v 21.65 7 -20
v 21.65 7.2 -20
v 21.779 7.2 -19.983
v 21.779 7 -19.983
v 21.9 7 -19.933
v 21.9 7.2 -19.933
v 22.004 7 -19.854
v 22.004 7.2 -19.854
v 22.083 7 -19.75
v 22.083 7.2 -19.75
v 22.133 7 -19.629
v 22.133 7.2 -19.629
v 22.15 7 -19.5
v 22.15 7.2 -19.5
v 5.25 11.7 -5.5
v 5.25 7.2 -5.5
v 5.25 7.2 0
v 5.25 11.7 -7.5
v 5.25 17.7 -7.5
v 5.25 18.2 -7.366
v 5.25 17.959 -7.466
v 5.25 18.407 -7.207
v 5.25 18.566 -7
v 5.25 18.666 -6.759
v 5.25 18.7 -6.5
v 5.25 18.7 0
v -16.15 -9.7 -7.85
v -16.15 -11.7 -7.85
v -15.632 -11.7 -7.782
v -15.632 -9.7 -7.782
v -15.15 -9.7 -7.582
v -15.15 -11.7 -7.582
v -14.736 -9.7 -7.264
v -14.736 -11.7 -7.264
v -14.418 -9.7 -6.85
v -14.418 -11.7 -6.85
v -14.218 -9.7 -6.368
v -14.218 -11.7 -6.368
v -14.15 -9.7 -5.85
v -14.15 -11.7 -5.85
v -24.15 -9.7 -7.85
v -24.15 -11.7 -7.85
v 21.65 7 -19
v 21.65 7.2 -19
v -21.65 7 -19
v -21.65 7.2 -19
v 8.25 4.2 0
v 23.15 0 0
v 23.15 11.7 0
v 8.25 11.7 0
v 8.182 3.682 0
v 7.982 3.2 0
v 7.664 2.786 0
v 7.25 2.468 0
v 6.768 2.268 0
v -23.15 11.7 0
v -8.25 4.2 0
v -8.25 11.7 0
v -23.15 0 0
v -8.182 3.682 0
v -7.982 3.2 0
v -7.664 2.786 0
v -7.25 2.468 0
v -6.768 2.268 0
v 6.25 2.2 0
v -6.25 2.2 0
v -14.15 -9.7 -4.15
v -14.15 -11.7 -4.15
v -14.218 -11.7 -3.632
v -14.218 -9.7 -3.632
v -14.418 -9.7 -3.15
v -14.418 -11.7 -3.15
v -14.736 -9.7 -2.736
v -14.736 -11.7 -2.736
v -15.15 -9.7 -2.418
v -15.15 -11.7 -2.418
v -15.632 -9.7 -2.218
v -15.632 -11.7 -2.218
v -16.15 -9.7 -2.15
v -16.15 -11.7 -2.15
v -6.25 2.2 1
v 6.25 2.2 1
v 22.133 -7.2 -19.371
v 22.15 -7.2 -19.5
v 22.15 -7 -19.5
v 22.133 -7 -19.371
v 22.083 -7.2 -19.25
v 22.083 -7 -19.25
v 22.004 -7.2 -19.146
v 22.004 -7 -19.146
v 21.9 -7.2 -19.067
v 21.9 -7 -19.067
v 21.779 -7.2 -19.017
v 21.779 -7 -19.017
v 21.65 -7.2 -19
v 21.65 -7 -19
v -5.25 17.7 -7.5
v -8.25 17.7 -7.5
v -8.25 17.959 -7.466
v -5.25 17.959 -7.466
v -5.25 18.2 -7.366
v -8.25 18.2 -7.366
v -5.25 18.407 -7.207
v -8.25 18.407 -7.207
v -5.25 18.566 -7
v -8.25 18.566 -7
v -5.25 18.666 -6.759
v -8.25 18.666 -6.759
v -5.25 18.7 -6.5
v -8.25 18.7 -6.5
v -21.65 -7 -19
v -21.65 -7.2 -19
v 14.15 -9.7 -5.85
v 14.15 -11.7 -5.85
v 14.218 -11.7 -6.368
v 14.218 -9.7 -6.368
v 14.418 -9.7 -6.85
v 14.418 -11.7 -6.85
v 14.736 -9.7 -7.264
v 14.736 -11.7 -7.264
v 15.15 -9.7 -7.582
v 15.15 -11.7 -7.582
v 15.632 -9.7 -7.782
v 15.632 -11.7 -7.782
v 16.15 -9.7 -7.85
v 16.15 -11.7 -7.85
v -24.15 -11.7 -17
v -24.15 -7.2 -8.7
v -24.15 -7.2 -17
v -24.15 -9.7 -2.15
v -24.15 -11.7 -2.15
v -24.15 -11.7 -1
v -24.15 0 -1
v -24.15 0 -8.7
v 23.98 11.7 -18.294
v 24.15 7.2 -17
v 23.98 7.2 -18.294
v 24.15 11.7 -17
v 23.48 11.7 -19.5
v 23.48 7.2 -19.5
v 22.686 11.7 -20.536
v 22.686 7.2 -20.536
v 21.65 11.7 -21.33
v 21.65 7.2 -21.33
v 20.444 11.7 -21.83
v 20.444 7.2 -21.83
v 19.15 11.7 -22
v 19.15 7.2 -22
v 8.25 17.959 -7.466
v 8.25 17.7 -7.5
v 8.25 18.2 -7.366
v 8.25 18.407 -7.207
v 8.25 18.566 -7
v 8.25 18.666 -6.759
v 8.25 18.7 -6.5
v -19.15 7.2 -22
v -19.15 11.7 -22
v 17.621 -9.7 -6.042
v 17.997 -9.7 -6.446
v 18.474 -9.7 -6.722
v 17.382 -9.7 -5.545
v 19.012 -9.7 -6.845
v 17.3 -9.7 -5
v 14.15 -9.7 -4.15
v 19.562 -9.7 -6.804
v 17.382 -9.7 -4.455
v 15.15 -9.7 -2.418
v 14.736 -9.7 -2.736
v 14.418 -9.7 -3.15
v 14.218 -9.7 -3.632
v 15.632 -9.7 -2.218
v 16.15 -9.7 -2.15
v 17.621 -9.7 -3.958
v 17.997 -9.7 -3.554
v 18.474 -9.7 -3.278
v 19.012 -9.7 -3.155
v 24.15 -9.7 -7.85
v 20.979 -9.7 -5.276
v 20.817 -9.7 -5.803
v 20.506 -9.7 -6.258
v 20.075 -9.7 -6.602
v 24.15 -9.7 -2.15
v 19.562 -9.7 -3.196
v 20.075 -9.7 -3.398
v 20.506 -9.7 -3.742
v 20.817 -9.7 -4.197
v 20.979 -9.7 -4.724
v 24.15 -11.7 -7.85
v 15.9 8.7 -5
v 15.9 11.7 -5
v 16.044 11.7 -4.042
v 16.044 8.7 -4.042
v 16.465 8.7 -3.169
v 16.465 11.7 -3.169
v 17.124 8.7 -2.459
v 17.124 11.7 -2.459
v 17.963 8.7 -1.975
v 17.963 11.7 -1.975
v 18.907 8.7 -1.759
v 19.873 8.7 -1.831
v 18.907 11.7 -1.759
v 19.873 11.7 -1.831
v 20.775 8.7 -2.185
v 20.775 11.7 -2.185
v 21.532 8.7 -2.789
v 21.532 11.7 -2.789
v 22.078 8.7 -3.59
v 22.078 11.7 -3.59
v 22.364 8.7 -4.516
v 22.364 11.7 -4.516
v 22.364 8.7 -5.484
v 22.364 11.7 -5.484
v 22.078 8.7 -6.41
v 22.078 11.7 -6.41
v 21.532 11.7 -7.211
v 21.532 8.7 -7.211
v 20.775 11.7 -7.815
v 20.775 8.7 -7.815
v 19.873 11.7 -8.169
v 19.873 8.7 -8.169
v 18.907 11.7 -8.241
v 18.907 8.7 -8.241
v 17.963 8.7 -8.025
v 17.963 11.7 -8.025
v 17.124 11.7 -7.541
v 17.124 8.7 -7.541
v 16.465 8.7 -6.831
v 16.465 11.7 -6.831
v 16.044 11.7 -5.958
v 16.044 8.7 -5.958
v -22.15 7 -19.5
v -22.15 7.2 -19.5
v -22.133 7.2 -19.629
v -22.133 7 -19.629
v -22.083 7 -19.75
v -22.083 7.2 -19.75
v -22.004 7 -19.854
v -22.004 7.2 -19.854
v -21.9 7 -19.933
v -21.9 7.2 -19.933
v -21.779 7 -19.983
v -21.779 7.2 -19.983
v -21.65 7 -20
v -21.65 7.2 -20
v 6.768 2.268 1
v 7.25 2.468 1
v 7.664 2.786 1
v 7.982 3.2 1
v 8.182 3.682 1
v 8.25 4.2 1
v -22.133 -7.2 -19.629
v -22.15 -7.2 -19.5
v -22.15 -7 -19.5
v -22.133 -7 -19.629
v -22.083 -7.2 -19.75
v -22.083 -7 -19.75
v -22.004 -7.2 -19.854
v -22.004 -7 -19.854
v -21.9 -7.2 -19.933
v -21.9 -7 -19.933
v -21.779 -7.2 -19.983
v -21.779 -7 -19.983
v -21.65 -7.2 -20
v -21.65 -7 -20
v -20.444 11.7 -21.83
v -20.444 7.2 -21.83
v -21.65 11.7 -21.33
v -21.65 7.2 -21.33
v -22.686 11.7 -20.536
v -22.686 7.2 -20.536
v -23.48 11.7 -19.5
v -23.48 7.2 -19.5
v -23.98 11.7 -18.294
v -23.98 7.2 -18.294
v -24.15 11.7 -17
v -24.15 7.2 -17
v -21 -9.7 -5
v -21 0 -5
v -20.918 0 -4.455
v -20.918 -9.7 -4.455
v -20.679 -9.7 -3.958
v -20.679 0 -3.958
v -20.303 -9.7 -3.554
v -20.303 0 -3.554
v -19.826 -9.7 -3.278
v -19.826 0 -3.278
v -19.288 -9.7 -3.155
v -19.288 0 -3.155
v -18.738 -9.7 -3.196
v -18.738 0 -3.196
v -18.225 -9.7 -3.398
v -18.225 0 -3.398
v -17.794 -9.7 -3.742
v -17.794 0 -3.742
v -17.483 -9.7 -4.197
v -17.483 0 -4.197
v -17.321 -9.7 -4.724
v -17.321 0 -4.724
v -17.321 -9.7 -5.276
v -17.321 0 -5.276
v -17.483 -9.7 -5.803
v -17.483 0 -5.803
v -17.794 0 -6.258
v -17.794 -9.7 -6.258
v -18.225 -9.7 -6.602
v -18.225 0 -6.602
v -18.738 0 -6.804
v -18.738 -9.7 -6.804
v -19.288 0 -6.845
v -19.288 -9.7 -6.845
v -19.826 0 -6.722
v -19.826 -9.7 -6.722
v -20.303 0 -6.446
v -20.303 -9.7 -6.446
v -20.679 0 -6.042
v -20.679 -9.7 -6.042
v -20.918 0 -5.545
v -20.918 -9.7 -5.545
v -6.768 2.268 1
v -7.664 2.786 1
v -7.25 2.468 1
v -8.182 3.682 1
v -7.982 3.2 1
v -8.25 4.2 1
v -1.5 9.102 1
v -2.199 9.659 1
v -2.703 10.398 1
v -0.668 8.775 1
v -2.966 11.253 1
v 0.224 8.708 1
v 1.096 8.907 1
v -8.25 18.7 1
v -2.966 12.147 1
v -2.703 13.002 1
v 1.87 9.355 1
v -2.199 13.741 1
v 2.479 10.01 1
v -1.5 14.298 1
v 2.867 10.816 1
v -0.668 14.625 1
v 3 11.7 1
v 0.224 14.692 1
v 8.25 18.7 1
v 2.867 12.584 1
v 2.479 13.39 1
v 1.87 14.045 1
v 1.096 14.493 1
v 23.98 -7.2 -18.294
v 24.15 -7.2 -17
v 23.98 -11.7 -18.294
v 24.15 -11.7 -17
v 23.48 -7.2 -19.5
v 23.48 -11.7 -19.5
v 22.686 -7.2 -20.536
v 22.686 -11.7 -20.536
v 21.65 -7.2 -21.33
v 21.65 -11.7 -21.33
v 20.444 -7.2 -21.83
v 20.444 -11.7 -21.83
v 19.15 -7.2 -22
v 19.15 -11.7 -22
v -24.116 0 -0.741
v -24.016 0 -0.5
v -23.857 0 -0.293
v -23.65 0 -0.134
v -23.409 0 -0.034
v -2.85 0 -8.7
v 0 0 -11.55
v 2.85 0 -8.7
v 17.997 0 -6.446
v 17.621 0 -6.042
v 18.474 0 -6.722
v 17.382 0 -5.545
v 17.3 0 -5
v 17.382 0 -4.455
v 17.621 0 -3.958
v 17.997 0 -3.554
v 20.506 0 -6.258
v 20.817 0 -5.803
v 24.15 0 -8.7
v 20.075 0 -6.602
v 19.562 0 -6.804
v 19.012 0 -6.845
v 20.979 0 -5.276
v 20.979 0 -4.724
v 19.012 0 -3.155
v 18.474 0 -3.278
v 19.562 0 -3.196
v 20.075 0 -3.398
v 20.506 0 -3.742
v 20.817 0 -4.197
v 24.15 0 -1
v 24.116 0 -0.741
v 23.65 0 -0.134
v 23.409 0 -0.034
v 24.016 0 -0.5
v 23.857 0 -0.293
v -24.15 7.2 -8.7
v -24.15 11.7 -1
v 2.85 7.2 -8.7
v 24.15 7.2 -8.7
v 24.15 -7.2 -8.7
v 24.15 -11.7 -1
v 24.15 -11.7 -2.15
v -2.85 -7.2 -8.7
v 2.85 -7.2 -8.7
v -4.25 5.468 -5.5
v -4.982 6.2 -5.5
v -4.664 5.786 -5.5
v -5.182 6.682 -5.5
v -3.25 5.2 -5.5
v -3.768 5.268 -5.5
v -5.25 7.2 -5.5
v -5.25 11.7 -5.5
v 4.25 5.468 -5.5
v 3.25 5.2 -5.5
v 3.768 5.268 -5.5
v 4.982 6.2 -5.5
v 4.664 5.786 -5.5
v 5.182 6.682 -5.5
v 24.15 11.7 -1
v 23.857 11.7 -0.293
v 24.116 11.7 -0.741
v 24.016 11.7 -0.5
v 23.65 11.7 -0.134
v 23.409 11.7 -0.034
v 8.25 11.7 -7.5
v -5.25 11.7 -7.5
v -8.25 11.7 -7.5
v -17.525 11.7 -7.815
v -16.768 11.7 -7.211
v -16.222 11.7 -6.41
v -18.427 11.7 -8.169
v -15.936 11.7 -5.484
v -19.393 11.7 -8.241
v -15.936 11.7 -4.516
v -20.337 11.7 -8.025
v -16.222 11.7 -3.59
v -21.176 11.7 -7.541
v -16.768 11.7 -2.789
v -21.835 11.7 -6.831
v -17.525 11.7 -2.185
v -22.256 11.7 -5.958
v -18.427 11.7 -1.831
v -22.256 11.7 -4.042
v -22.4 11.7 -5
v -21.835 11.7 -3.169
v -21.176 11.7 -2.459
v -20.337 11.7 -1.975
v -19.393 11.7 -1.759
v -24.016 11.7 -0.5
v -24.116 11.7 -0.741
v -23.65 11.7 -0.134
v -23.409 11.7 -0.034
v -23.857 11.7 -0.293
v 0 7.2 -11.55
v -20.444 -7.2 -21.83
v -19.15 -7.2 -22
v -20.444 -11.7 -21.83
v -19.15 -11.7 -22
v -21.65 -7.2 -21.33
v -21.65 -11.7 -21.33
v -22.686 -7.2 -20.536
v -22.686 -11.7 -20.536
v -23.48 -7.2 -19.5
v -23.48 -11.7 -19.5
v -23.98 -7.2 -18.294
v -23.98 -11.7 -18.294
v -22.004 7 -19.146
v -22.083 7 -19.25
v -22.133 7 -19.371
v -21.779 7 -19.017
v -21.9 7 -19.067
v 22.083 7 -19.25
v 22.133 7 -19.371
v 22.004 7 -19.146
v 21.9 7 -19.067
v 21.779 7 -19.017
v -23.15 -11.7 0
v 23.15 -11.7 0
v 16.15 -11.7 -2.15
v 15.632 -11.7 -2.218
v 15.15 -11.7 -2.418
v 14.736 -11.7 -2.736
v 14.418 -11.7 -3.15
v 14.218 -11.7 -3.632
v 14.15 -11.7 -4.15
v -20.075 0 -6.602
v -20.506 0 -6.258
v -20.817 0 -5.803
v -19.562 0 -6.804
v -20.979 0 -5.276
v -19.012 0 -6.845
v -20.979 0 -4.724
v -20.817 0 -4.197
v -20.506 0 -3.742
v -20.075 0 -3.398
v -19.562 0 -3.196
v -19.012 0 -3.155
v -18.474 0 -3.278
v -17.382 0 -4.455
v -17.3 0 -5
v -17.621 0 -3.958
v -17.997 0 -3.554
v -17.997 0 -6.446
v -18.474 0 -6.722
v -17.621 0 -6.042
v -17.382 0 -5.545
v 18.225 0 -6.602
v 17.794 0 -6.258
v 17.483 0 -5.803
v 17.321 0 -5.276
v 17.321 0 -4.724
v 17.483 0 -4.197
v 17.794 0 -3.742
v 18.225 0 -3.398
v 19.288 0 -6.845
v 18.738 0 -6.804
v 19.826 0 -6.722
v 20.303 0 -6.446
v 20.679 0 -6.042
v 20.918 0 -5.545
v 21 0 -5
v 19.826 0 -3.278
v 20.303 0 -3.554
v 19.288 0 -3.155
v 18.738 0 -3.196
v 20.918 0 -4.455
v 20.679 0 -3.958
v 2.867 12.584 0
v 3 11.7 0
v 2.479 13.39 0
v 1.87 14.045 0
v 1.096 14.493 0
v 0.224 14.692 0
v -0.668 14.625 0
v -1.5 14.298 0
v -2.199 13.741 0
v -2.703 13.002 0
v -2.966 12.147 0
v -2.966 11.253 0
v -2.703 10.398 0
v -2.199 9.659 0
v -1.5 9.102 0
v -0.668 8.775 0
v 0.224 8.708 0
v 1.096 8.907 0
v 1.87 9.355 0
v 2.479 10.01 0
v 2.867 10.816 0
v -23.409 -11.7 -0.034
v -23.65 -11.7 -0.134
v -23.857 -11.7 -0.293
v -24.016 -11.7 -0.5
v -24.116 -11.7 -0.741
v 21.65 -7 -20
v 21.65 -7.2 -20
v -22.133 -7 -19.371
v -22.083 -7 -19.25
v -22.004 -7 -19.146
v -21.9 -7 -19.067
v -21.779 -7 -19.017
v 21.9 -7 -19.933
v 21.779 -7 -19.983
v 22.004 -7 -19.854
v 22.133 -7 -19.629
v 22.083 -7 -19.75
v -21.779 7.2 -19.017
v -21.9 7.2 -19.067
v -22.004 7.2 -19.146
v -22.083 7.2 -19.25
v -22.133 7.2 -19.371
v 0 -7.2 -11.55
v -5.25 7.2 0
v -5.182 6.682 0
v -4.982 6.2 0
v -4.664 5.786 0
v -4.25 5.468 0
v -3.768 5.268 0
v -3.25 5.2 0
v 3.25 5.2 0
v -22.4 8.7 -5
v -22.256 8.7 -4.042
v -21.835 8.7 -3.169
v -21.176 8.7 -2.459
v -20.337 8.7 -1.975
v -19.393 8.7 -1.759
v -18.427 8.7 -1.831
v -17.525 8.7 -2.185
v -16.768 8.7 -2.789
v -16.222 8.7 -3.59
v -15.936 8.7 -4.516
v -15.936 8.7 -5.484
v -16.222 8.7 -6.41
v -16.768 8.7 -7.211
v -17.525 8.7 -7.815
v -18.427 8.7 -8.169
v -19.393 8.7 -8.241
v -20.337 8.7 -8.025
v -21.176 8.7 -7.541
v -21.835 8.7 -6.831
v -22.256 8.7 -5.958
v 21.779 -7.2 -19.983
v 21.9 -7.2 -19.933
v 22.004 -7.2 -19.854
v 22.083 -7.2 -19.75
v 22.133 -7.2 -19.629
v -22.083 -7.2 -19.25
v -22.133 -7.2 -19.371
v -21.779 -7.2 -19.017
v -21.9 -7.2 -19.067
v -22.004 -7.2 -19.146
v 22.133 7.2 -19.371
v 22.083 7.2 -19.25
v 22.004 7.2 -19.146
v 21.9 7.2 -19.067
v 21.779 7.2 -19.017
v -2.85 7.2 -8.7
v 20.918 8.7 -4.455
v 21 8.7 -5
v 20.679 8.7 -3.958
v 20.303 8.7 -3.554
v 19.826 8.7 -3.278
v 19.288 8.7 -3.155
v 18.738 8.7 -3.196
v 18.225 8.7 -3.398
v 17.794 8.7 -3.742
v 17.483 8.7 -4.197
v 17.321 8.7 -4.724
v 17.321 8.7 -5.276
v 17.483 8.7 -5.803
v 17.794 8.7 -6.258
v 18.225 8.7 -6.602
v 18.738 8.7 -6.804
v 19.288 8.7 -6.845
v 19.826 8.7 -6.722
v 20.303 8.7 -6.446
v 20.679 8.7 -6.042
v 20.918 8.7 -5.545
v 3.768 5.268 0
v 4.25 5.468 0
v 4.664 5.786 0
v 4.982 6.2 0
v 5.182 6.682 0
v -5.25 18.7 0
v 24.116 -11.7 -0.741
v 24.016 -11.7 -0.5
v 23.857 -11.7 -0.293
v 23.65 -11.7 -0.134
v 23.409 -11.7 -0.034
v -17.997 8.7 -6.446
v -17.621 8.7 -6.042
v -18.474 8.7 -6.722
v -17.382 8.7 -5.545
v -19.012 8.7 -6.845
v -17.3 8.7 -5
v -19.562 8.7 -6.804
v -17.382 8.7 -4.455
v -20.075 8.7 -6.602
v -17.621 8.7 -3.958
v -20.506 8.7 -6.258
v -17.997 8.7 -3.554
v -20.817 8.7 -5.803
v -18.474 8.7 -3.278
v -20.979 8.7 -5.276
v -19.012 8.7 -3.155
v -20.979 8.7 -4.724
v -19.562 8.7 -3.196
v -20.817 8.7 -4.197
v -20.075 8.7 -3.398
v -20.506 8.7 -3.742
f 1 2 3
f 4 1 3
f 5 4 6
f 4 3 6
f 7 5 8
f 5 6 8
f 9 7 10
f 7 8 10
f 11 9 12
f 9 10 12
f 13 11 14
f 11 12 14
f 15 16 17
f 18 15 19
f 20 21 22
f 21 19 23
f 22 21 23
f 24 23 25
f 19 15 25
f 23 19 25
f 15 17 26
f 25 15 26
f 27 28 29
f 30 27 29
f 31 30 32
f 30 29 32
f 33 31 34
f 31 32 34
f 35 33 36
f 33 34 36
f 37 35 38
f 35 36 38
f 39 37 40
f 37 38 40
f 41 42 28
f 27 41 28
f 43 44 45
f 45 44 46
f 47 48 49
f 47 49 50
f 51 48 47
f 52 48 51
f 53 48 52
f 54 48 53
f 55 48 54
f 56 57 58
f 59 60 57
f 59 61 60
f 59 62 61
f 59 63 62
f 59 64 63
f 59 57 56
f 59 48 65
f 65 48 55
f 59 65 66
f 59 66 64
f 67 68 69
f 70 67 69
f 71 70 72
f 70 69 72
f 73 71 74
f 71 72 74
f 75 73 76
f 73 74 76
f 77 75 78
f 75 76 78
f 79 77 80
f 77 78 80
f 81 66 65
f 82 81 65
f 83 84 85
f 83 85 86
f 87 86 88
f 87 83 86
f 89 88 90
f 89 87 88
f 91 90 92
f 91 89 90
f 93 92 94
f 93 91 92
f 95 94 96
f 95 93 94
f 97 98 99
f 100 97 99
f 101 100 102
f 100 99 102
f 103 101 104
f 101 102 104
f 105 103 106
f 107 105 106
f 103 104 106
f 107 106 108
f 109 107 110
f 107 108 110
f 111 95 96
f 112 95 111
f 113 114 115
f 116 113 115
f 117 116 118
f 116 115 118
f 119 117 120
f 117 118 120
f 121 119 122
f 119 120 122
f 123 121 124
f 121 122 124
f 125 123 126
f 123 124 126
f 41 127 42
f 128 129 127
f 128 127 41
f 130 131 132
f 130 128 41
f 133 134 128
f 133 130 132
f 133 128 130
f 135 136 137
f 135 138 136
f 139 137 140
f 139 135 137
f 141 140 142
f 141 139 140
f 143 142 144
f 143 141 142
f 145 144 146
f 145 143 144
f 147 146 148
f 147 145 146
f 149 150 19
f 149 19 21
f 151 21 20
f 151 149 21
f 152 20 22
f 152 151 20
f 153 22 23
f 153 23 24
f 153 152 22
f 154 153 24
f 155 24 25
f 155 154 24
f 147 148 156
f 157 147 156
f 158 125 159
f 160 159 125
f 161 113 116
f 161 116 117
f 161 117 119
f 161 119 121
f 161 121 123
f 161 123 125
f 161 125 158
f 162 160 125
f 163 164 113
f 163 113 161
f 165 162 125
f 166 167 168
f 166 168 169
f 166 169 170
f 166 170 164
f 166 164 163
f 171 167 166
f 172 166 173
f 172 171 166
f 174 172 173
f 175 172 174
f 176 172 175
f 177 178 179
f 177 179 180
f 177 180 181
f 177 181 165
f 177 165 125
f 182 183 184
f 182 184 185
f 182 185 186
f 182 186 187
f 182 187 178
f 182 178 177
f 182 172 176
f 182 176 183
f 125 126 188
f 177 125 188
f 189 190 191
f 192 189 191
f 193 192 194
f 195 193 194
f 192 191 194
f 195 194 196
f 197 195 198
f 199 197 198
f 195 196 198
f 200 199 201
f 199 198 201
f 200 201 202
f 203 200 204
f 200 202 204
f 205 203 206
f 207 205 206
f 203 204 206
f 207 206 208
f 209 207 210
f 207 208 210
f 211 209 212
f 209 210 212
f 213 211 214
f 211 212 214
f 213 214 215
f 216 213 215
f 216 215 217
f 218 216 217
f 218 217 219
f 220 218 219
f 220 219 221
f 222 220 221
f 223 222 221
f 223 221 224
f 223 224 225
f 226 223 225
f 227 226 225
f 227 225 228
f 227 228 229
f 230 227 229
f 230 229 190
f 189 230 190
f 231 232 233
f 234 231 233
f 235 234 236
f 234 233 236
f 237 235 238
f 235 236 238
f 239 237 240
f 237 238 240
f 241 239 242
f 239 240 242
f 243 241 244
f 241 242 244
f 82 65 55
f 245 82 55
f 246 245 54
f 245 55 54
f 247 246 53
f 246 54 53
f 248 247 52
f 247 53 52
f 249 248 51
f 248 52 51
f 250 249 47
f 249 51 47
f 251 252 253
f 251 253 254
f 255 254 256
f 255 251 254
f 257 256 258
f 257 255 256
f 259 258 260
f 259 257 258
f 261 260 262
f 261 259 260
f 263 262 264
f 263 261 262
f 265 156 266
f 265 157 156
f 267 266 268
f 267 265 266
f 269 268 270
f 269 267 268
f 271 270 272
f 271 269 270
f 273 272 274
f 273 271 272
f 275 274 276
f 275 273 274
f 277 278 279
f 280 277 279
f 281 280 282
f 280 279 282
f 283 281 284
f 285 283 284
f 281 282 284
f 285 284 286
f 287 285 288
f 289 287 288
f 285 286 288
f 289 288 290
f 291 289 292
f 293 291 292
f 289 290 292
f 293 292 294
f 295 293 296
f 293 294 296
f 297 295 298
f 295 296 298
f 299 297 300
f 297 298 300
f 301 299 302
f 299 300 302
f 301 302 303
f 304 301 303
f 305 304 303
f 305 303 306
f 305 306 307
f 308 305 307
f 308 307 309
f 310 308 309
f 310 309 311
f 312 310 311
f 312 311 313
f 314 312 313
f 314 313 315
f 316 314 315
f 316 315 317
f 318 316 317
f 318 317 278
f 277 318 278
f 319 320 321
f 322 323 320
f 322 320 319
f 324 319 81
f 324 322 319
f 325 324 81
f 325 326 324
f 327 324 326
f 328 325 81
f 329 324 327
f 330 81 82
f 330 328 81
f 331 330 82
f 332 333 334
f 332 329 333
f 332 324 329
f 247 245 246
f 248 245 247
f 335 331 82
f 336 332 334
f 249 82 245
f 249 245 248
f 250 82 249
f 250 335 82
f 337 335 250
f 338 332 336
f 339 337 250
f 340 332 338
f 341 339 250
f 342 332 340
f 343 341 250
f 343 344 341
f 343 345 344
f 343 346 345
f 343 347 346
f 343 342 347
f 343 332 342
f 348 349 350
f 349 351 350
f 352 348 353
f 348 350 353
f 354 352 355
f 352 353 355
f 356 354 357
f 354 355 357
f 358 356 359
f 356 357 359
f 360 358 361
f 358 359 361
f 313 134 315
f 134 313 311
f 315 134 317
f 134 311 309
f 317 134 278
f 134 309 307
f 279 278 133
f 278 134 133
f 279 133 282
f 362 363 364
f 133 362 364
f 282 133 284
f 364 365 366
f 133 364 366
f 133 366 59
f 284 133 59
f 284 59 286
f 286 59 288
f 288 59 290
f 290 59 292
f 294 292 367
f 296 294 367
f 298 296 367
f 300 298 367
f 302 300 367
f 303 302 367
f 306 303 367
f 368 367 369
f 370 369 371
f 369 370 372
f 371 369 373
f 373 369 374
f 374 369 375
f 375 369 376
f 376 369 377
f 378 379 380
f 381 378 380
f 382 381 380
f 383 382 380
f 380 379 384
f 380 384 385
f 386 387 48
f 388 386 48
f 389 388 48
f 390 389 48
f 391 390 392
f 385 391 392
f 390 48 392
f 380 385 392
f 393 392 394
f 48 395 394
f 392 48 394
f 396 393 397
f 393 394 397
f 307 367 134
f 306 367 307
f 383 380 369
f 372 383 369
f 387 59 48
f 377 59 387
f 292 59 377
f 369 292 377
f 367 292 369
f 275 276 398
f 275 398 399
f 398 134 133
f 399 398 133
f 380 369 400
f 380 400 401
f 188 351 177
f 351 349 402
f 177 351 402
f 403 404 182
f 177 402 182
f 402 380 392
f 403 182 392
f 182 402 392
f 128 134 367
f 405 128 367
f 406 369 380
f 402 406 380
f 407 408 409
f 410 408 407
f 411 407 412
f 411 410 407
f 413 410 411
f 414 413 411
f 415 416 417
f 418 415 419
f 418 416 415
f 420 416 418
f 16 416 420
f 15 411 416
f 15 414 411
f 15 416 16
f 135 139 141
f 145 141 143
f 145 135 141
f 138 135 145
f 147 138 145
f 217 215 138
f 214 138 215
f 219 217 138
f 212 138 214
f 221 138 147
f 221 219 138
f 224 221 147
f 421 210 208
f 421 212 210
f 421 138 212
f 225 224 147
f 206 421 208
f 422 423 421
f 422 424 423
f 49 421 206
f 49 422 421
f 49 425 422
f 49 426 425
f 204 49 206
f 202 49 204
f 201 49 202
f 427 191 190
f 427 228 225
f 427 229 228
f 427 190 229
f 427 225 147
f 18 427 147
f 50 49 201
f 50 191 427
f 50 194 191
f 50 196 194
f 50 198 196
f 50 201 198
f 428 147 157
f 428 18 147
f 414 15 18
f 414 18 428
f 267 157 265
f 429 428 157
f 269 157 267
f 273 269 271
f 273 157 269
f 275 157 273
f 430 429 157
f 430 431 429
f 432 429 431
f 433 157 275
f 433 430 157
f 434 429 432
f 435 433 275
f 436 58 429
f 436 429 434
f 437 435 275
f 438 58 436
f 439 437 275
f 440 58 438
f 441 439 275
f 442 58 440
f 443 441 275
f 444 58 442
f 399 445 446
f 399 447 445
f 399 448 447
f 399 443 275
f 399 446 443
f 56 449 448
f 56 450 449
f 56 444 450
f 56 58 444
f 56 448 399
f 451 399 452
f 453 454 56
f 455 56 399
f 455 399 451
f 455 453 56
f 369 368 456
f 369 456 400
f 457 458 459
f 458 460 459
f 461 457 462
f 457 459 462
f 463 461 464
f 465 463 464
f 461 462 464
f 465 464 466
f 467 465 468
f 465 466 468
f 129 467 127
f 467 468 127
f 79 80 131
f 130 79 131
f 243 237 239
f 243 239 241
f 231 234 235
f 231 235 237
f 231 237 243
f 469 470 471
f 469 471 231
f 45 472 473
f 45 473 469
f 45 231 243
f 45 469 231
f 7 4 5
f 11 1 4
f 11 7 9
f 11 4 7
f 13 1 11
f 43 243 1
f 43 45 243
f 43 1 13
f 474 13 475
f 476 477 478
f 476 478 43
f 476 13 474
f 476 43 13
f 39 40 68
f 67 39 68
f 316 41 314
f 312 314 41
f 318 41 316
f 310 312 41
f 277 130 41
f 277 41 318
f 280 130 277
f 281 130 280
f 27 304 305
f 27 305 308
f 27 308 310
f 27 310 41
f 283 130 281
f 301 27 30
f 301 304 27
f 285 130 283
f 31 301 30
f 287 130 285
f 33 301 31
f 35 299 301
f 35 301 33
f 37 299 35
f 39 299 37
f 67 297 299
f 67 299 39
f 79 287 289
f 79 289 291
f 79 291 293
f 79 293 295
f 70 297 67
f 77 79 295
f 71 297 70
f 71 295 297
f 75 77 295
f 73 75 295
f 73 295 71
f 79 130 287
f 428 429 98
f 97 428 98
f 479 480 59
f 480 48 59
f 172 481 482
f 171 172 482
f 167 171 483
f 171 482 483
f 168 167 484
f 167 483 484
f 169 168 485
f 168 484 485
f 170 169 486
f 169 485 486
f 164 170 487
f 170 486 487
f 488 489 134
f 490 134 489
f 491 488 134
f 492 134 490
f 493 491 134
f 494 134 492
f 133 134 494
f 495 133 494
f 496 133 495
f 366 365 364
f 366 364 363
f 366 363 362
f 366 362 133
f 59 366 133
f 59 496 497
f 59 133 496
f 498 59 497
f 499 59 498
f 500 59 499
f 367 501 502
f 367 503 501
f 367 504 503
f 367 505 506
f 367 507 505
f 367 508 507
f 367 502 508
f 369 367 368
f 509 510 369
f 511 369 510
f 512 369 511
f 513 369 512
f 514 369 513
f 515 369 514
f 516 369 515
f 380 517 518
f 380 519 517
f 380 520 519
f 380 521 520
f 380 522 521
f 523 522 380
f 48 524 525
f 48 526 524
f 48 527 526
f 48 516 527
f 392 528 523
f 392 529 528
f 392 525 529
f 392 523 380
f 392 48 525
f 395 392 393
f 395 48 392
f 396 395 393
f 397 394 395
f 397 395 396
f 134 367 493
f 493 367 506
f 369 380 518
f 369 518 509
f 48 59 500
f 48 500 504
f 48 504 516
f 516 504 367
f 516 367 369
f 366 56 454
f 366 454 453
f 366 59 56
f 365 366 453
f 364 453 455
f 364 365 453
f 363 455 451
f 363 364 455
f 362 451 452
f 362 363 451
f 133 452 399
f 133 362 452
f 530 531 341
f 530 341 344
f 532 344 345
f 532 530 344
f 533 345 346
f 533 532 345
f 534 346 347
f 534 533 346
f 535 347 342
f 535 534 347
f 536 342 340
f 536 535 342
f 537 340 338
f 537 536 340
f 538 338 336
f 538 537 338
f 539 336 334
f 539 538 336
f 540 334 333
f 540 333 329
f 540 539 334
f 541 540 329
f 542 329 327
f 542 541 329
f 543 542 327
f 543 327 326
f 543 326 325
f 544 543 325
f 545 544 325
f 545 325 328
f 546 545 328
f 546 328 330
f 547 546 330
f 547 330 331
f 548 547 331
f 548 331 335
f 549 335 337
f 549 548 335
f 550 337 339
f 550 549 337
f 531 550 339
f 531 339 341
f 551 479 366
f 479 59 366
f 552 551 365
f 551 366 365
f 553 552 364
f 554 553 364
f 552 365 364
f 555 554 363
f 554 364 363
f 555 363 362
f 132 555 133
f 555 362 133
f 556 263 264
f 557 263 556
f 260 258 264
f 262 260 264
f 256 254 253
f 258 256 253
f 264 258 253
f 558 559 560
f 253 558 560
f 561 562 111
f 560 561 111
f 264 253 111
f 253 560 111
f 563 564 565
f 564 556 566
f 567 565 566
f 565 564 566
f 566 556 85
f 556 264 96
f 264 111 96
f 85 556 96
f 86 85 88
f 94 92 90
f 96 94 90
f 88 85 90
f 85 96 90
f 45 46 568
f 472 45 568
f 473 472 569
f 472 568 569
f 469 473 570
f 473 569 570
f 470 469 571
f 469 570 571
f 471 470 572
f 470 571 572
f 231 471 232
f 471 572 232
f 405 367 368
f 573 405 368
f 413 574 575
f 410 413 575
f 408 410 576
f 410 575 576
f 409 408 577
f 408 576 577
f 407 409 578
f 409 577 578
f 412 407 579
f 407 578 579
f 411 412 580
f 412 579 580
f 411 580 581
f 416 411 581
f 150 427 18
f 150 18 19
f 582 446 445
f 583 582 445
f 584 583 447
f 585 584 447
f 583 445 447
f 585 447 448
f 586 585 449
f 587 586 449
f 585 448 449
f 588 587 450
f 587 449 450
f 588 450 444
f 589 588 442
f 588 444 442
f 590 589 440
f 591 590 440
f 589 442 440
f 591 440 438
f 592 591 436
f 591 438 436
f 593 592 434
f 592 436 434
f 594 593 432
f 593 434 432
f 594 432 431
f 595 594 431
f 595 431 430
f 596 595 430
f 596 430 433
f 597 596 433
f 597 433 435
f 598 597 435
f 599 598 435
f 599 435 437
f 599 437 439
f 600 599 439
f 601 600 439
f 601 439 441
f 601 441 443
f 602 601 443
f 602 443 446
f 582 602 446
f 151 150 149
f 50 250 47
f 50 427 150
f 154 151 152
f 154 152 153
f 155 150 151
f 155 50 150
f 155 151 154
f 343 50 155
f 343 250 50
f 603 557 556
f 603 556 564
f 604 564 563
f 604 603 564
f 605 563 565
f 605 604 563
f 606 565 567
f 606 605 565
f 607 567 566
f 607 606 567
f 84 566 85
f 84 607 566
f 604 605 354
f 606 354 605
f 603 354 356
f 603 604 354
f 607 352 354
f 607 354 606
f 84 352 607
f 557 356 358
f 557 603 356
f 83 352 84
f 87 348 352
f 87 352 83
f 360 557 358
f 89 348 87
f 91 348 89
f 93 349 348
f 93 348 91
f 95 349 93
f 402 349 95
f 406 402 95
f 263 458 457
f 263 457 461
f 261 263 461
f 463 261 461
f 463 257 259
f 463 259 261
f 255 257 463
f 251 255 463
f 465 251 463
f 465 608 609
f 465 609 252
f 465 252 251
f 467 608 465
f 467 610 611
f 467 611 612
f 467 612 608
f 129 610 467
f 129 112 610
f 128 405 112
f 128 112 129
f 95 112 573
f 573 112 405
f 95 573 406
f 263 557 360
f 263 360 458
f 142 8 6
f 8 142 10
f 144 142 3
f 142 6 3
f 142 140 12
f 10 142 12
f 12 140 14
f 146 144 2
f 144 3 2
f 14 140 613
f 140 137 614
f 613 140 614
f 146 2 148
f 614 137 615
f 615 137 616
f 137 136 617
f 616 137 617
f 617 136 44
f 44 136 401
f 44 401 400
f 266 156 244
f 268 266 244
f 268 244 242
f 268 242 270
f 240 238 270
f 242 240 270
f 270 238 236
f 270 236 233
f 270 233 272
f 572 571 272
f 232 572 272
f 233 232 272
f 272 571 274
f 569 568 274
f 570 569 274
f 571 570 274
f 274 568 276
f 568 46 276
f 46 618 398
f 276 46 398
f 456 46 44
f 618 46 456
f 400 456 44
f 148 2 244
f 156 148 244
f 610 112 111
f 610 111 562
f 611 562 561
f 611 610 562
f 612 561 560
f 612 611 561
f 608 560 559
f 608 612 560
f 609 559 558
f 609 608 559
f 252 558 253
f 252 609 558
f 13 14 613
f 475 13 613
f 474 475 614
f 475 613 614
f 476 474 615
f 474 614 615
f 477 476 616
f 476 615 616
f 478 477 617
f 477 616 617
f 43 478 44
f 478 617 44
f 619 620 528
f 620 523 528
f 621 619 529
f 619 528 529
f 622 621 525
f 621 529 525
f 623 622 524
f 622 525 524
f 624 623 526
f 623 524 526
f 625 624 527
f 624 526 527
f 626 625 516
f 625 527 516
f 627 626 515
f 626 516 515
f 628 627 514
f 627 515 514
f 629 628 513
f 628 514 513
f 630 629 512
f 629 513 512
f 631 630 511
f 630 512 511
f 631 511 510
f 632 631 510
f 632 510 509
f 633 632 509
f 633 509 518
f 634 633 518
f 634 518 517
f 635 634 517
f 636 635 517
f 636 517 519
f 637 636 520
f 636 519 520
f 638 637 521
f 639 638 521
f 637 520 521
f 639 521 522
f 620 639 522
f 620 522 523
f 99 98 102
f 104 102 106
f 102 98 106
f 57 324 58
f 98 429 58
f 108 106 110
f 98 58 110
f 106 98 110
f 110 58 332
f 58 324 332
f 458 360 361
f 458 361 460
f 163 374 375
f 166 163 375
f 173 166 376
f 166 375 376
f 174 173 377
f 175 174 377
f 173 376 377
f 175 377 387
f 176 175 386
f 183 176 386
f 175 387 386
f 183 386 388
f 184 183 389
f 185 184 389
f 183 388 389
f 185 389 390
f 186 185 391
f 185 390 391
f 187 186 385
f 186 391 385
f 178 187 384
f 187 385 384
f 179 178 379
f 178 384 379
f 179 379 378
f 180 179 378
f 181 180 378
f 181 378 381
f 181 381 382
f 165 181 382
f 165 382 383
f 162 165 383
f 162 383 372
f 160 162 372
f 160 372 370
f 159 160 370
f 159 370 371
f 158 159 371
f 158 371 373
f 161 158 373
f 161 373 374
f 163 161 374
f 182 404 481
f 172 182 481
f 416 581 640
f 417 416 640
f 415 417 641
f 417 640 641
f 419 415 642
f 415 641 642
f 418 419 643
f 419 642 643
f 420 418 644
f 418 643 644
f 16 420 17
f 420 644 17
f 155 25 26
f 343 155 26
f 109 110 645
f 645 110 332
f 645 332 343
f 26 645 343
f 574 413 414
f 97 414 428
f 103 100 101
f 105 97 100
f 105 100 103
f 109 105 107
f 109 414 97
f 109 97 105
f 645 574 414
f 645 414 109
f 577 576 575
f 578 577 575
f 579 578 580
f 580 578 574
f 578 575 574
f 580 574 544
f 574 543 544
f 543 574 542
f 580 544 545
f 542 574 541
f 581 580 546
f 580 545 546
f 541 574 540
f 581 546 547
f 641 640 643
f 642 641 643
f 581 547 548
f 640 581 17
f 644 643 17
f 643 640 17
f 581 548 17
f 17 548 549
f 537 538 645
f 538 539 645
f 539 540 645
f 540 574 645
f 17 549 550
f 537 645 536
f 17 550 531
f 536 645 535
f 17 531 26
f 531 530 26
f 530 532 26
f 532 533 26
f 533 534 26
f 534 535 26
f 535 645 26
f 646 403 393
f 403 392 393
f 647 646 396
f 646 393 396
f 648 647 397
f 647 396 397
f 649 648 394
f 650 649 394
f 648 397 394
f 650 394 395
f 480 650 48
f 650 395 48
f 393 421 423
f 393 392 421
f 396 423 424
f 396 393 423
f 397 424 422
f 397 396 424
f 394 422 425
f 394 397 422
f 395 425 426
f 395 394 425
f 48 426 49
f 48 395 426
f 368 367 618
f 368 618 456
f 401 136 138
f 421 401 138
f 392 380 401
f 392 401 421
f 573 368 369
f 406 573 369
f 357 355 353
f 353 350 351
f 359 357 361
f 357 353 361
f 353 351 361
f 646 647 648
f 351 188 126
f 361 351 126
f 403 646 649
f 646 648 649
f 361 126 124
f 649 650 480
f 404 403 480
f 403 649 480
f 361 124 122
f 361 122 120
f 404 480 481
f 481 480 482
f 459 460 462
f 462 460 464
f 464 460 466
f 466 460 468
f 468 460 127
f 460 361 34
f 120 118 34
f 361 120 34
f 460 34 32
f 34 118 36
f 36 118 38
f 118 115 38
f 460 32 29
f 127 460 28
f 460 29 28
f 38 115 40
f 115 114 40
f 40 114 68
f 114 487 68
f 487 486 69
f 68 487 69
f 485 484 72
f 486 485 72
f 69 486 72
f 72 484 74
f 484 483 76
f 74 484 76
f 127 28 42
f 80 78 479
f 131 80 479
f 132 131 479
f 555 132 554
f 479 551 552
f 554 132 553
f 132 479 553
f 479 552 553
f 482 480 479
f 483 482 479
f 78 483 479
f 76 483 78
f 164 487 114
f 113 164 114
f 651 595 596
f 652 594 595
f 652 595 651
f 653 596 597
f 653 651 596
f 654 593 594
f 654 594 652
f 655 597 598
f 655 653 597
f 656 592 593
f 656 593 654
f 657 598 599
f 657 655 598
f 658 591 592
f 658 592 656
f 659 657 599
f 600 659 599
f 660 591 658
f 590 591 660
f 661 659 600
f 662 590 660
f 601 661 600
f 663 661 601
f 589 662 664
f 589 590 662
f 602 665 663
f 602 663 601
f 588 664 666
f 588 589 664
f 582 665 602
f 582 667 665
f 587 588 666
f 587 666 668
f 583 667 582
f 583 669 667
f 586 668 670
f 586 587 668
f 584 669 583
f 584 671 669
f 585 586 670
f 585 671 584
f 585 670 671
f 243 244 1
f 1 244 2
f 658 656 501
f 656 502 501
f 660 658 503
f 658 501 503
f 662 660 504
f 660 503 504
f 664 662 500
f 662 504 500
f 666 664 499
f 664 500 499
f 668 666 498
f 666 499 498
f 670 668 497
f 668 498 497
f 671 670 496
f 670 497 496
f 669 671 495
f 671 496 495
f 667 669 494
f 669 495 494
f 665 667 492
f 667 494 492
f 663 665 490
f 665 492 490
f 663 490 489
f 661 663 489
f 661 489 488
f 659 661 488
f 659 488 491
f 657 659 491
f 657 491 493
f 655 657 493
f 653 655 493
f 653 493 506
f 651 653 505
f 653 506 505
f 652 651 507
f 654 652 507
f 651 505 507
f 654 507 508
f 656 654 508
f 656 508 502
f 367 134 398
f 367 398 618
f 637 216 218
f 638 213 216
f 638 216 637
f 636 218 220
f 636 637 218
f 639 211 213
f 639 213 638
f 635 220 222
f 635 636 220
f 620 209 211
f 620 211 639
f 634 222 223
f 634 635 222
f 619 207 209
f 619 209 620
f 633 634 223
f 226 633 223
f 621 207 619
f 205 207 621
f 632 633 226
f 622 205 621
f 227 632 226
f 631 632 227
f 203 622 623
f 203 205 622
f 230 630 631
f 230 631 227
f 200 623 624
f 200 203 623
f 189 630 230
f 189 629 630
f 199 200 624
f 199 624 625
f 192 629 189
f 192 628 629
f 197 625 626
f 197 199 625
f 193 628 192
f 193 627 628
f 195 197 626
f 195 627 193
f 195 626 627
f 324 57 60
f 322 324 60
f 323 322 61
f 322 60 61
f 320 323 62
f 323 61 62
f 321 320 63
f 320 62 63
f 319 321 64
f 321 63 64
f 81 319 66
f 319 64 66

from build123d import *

# Parameters (mm, degrees)
F2_DEPTH        = 7.2
F3_W            = 48.3
F3_H            = 22
F4_DEPTH        = 4.5
F7_DEPTH        = 0.2
F10_D           = 3.7
F10_CBORE_D     = 6.5
F10_CBORE_DEPTH = 3
F11_D           = 3.7
F13_DEPTH       = 2
F14_R           = 1
F14_2_R         = 1
F15_R           = 5
F15_2_R         = 5
F17_DEPTH       = 5.5
F18_R           = 3
F19_DEPTH       = 1
F21_DEPTH       = 3


# Not quite as in the source:
# - a pattern or mirror of a feature is missing from the dataset's text; its kind, count and spacing are read off the source's solid


with BuildPart() as f2:
    # F1 (on Front) → F2 (new body)
    with BuildSketch(Plane.XZ):
        Polygon((-24.15, 0), (-24.15, -8.7), (-2.85, -8.7), (0, -11.55), (2.85, -8.7), (24.15, -8.7), (24.15, 0), align=None)
    extrude(amount=-F2_DEPTH)

    # F3 (on face) → F4 (join)
    with BuildSketch(Plane(origin=(0, 7.2, 0), x_dir=(-1, 0, 0), z_dir=(0, 1, 0))):
        with Locations((0, -11)):
            Rectangle(F3_W, F3_H)
    extrude(amount=F4_DEPTH)

    # F6 (on face) → F7 (join)
    with BuildSketch(Plane.XZ.offset(-7.2)):
        with BuildLine():
            ThreePointArc((22.15, -19.5), (22.0035533906, -19.1464466094), (21.65, -19))
            Line((21.65, -19), (-21.65, -19))
            ThreePointArc((-21.65, -19), (-22.0035533906, -19.1464466094), (-22.15, -19.5))
            ThreePointArc((-22.15, -19.5), (-22.0035533906, -19.8535533906), (-21.65, -20))
            Line((-21.65, -20), (21.65, -20))
            ThreePointArc((21.65, -20), (22.0035533906, -19.8535533906), (22.15, -19.5))
        make_face()
    extrude(amount=F7_DEPTH)


with BuildPart() as f8_1:
    # F8: instance of F2
    add(f2.part.mirror(Plane.XZ))

    # F11 (through all)
    with Locations(Plane.XZ.offset(11.7)):
        with Locations((-19.15, -5), (19.15, -5)):
            Hole(F11_D / 2)

    # F12 (on face) → F13 (cut)
    with BuildSketch(Plane.XZ.offset(11.7)):
        with BuildLine():
            Line((-16.15, -2.15), (-24.15, -2.15))
            Line((-24.15, -2.15), (-24.15, -7.85))
            Line((-24.15, -7.85), (-16.15, -7.85))
            ThreePointArc((-16.15, -7.85), (-14.7357864376, -7.2642135624), (-14.15, -5.85))
            Line((-14.15, -5.85), (-14.15, -4.15))
            ThreePointArc((-14.15, -4.15), (-14.7357864376, -2.7357864376), (-16.15, -2.15))
        make_face()
        with BuildLine():
            ThreePointArc((16.15, -2.15), (14.7357864376, -2.7357864376), (14.15, -4.15))
            Line((14.15, -4.15), (14.15, -5.85))
            ThreePointArc((14.15, -5.85), (14.7357864376, -7.2642135624), (16.15, -7.85))
            Line((16.15, -7.85), (24.15, -7.85))
            Line((24.15, -7.85), (24.15, -2.15))
            Line((24.15, -2.15), (16.15, -2.15))
        make_face()
    extrude(amount=-F13_DEPTH, mode=Mode.SUBTRACT)

    # F14#2
    f14_2_edges = [f8_1.edges().sort_by_distance(p)[0] for p in [
        (-24.15, -5.85, 0),
        (24.15, -5.85, 0),
    ]]
    fillet(f14_2_edges, radius=F14_2_R)

    # F15#2
    f15_2_edges = [f8_1.edges().sort_by_distance(p)[0] for p in [
        (24.15, -9.45, -22),
        (-24.15, -9.45, -22),
    ]]
    fillet(f15_2_edges, radius=F15_2_R)


with BuildPart() as f2_1:
    add(f2.part)

    # F10 (through all)
    with Locations(Plane(origin=(0, 11.7, 0), x_dir=(-1, 0, 0), z_dir=(0, 1, 0))):
        with Locations((-19.15, -5), (19.15, -5)):
            CounterBoreHole(F10_D / 2, F10_CBORE_D / 2, F10_CBORE_DEPTH)

    # F14
    f14_edges = [f2_1.edges().sort_by_distance(p)[0] for p in [
        (-24.15, 5.85, 0),
        (24.15, 5.85, 0),
    ]]
    fillet(f14_edges, radius=F14_R)

    # F15
    f15_edges = [f2_1.edges().sort_by_distance(p)[0] for p in [
        (24.15, 9.45, -22),
        (-24.15, 9.45, -22),
    ]]
    fillet(f15_edges, radius=F15_R)

    # F16 (on face) → F17 (cut)
    with BuildSketch(Plane.XY):
        with BuildLine():
            ThreePointArc((-5.25, 7.2), (-4.6642135624, 5.7857864376), (-3.25, 5.2))
            Line((-3.25, 5.2), (3.25, 5.2))
            ThreePointArc((3.25, 5.2), (4.6642135624, 5.7857864376), (5.25, 7.2))
            Line((5.25, 7.2), (5.25, 11.7))
            Line((5.25, 11.7), (-5.25, 11.7))
            Line((-5.25, 11.7), (-5.25, 7.2))
        make_face()
    extrude(amount=-F17_DEPTH, mode=Mode.SUBTRACT)

    # F18 (on face) → F19 (join)
    with BuildSketch(Plane.XY):
        with BuildLine():
            Line((8.25, 18.7), (-8.25, 18.7))
            Line((-8.25, 18.7), (-8.25, 4.2))
            ThreePointArc((-8.25, 4.2), (-7.6642135624, 2.7857864376), (-6.25, 2.2))
            Line((-6.25, 2.2), (6.25, 2.2))
            ThreePointArc((6.25, 2.2), (7.6642135624, 2.7857864376), (8.25, 4.2))
            Line((8.25, 4.2), (8.25, 18.7))
        make_face()
        with Locations((0, 11.7)):
            Circle(F18_R, mode=Mode.SUBTRACT)
    extrude(amount=F19_DEPTH)

    # F20 (on face) → F21 (join)
    with BuildSketch(Plane.YZ.offset(8.25)):
        with BuildLine():
            Line((18.7, -6.5), (18.7, 0))
            Line((18.7, 0), (11.7, 0))
            Line((11.7, 0), (11.7, -7.5))
            Line((11.7, -7.5), (17.7, -7.5))
            ThreePointArc((17.7, -7.5), (18.4071067812, -7.2071067812), (18.7, -6.5))
        make_face()
    f21 = extrude(amount=-F21_DEPTH)

    # F21_copies: F21 across plane
    add(f21.mirror(Plane(origin=(0, 0, 0), x_dir=(0, 0, -1), z_dir=(-1, 0, 0))))


solid = Compound([f8_1.part, f2_1.part])
